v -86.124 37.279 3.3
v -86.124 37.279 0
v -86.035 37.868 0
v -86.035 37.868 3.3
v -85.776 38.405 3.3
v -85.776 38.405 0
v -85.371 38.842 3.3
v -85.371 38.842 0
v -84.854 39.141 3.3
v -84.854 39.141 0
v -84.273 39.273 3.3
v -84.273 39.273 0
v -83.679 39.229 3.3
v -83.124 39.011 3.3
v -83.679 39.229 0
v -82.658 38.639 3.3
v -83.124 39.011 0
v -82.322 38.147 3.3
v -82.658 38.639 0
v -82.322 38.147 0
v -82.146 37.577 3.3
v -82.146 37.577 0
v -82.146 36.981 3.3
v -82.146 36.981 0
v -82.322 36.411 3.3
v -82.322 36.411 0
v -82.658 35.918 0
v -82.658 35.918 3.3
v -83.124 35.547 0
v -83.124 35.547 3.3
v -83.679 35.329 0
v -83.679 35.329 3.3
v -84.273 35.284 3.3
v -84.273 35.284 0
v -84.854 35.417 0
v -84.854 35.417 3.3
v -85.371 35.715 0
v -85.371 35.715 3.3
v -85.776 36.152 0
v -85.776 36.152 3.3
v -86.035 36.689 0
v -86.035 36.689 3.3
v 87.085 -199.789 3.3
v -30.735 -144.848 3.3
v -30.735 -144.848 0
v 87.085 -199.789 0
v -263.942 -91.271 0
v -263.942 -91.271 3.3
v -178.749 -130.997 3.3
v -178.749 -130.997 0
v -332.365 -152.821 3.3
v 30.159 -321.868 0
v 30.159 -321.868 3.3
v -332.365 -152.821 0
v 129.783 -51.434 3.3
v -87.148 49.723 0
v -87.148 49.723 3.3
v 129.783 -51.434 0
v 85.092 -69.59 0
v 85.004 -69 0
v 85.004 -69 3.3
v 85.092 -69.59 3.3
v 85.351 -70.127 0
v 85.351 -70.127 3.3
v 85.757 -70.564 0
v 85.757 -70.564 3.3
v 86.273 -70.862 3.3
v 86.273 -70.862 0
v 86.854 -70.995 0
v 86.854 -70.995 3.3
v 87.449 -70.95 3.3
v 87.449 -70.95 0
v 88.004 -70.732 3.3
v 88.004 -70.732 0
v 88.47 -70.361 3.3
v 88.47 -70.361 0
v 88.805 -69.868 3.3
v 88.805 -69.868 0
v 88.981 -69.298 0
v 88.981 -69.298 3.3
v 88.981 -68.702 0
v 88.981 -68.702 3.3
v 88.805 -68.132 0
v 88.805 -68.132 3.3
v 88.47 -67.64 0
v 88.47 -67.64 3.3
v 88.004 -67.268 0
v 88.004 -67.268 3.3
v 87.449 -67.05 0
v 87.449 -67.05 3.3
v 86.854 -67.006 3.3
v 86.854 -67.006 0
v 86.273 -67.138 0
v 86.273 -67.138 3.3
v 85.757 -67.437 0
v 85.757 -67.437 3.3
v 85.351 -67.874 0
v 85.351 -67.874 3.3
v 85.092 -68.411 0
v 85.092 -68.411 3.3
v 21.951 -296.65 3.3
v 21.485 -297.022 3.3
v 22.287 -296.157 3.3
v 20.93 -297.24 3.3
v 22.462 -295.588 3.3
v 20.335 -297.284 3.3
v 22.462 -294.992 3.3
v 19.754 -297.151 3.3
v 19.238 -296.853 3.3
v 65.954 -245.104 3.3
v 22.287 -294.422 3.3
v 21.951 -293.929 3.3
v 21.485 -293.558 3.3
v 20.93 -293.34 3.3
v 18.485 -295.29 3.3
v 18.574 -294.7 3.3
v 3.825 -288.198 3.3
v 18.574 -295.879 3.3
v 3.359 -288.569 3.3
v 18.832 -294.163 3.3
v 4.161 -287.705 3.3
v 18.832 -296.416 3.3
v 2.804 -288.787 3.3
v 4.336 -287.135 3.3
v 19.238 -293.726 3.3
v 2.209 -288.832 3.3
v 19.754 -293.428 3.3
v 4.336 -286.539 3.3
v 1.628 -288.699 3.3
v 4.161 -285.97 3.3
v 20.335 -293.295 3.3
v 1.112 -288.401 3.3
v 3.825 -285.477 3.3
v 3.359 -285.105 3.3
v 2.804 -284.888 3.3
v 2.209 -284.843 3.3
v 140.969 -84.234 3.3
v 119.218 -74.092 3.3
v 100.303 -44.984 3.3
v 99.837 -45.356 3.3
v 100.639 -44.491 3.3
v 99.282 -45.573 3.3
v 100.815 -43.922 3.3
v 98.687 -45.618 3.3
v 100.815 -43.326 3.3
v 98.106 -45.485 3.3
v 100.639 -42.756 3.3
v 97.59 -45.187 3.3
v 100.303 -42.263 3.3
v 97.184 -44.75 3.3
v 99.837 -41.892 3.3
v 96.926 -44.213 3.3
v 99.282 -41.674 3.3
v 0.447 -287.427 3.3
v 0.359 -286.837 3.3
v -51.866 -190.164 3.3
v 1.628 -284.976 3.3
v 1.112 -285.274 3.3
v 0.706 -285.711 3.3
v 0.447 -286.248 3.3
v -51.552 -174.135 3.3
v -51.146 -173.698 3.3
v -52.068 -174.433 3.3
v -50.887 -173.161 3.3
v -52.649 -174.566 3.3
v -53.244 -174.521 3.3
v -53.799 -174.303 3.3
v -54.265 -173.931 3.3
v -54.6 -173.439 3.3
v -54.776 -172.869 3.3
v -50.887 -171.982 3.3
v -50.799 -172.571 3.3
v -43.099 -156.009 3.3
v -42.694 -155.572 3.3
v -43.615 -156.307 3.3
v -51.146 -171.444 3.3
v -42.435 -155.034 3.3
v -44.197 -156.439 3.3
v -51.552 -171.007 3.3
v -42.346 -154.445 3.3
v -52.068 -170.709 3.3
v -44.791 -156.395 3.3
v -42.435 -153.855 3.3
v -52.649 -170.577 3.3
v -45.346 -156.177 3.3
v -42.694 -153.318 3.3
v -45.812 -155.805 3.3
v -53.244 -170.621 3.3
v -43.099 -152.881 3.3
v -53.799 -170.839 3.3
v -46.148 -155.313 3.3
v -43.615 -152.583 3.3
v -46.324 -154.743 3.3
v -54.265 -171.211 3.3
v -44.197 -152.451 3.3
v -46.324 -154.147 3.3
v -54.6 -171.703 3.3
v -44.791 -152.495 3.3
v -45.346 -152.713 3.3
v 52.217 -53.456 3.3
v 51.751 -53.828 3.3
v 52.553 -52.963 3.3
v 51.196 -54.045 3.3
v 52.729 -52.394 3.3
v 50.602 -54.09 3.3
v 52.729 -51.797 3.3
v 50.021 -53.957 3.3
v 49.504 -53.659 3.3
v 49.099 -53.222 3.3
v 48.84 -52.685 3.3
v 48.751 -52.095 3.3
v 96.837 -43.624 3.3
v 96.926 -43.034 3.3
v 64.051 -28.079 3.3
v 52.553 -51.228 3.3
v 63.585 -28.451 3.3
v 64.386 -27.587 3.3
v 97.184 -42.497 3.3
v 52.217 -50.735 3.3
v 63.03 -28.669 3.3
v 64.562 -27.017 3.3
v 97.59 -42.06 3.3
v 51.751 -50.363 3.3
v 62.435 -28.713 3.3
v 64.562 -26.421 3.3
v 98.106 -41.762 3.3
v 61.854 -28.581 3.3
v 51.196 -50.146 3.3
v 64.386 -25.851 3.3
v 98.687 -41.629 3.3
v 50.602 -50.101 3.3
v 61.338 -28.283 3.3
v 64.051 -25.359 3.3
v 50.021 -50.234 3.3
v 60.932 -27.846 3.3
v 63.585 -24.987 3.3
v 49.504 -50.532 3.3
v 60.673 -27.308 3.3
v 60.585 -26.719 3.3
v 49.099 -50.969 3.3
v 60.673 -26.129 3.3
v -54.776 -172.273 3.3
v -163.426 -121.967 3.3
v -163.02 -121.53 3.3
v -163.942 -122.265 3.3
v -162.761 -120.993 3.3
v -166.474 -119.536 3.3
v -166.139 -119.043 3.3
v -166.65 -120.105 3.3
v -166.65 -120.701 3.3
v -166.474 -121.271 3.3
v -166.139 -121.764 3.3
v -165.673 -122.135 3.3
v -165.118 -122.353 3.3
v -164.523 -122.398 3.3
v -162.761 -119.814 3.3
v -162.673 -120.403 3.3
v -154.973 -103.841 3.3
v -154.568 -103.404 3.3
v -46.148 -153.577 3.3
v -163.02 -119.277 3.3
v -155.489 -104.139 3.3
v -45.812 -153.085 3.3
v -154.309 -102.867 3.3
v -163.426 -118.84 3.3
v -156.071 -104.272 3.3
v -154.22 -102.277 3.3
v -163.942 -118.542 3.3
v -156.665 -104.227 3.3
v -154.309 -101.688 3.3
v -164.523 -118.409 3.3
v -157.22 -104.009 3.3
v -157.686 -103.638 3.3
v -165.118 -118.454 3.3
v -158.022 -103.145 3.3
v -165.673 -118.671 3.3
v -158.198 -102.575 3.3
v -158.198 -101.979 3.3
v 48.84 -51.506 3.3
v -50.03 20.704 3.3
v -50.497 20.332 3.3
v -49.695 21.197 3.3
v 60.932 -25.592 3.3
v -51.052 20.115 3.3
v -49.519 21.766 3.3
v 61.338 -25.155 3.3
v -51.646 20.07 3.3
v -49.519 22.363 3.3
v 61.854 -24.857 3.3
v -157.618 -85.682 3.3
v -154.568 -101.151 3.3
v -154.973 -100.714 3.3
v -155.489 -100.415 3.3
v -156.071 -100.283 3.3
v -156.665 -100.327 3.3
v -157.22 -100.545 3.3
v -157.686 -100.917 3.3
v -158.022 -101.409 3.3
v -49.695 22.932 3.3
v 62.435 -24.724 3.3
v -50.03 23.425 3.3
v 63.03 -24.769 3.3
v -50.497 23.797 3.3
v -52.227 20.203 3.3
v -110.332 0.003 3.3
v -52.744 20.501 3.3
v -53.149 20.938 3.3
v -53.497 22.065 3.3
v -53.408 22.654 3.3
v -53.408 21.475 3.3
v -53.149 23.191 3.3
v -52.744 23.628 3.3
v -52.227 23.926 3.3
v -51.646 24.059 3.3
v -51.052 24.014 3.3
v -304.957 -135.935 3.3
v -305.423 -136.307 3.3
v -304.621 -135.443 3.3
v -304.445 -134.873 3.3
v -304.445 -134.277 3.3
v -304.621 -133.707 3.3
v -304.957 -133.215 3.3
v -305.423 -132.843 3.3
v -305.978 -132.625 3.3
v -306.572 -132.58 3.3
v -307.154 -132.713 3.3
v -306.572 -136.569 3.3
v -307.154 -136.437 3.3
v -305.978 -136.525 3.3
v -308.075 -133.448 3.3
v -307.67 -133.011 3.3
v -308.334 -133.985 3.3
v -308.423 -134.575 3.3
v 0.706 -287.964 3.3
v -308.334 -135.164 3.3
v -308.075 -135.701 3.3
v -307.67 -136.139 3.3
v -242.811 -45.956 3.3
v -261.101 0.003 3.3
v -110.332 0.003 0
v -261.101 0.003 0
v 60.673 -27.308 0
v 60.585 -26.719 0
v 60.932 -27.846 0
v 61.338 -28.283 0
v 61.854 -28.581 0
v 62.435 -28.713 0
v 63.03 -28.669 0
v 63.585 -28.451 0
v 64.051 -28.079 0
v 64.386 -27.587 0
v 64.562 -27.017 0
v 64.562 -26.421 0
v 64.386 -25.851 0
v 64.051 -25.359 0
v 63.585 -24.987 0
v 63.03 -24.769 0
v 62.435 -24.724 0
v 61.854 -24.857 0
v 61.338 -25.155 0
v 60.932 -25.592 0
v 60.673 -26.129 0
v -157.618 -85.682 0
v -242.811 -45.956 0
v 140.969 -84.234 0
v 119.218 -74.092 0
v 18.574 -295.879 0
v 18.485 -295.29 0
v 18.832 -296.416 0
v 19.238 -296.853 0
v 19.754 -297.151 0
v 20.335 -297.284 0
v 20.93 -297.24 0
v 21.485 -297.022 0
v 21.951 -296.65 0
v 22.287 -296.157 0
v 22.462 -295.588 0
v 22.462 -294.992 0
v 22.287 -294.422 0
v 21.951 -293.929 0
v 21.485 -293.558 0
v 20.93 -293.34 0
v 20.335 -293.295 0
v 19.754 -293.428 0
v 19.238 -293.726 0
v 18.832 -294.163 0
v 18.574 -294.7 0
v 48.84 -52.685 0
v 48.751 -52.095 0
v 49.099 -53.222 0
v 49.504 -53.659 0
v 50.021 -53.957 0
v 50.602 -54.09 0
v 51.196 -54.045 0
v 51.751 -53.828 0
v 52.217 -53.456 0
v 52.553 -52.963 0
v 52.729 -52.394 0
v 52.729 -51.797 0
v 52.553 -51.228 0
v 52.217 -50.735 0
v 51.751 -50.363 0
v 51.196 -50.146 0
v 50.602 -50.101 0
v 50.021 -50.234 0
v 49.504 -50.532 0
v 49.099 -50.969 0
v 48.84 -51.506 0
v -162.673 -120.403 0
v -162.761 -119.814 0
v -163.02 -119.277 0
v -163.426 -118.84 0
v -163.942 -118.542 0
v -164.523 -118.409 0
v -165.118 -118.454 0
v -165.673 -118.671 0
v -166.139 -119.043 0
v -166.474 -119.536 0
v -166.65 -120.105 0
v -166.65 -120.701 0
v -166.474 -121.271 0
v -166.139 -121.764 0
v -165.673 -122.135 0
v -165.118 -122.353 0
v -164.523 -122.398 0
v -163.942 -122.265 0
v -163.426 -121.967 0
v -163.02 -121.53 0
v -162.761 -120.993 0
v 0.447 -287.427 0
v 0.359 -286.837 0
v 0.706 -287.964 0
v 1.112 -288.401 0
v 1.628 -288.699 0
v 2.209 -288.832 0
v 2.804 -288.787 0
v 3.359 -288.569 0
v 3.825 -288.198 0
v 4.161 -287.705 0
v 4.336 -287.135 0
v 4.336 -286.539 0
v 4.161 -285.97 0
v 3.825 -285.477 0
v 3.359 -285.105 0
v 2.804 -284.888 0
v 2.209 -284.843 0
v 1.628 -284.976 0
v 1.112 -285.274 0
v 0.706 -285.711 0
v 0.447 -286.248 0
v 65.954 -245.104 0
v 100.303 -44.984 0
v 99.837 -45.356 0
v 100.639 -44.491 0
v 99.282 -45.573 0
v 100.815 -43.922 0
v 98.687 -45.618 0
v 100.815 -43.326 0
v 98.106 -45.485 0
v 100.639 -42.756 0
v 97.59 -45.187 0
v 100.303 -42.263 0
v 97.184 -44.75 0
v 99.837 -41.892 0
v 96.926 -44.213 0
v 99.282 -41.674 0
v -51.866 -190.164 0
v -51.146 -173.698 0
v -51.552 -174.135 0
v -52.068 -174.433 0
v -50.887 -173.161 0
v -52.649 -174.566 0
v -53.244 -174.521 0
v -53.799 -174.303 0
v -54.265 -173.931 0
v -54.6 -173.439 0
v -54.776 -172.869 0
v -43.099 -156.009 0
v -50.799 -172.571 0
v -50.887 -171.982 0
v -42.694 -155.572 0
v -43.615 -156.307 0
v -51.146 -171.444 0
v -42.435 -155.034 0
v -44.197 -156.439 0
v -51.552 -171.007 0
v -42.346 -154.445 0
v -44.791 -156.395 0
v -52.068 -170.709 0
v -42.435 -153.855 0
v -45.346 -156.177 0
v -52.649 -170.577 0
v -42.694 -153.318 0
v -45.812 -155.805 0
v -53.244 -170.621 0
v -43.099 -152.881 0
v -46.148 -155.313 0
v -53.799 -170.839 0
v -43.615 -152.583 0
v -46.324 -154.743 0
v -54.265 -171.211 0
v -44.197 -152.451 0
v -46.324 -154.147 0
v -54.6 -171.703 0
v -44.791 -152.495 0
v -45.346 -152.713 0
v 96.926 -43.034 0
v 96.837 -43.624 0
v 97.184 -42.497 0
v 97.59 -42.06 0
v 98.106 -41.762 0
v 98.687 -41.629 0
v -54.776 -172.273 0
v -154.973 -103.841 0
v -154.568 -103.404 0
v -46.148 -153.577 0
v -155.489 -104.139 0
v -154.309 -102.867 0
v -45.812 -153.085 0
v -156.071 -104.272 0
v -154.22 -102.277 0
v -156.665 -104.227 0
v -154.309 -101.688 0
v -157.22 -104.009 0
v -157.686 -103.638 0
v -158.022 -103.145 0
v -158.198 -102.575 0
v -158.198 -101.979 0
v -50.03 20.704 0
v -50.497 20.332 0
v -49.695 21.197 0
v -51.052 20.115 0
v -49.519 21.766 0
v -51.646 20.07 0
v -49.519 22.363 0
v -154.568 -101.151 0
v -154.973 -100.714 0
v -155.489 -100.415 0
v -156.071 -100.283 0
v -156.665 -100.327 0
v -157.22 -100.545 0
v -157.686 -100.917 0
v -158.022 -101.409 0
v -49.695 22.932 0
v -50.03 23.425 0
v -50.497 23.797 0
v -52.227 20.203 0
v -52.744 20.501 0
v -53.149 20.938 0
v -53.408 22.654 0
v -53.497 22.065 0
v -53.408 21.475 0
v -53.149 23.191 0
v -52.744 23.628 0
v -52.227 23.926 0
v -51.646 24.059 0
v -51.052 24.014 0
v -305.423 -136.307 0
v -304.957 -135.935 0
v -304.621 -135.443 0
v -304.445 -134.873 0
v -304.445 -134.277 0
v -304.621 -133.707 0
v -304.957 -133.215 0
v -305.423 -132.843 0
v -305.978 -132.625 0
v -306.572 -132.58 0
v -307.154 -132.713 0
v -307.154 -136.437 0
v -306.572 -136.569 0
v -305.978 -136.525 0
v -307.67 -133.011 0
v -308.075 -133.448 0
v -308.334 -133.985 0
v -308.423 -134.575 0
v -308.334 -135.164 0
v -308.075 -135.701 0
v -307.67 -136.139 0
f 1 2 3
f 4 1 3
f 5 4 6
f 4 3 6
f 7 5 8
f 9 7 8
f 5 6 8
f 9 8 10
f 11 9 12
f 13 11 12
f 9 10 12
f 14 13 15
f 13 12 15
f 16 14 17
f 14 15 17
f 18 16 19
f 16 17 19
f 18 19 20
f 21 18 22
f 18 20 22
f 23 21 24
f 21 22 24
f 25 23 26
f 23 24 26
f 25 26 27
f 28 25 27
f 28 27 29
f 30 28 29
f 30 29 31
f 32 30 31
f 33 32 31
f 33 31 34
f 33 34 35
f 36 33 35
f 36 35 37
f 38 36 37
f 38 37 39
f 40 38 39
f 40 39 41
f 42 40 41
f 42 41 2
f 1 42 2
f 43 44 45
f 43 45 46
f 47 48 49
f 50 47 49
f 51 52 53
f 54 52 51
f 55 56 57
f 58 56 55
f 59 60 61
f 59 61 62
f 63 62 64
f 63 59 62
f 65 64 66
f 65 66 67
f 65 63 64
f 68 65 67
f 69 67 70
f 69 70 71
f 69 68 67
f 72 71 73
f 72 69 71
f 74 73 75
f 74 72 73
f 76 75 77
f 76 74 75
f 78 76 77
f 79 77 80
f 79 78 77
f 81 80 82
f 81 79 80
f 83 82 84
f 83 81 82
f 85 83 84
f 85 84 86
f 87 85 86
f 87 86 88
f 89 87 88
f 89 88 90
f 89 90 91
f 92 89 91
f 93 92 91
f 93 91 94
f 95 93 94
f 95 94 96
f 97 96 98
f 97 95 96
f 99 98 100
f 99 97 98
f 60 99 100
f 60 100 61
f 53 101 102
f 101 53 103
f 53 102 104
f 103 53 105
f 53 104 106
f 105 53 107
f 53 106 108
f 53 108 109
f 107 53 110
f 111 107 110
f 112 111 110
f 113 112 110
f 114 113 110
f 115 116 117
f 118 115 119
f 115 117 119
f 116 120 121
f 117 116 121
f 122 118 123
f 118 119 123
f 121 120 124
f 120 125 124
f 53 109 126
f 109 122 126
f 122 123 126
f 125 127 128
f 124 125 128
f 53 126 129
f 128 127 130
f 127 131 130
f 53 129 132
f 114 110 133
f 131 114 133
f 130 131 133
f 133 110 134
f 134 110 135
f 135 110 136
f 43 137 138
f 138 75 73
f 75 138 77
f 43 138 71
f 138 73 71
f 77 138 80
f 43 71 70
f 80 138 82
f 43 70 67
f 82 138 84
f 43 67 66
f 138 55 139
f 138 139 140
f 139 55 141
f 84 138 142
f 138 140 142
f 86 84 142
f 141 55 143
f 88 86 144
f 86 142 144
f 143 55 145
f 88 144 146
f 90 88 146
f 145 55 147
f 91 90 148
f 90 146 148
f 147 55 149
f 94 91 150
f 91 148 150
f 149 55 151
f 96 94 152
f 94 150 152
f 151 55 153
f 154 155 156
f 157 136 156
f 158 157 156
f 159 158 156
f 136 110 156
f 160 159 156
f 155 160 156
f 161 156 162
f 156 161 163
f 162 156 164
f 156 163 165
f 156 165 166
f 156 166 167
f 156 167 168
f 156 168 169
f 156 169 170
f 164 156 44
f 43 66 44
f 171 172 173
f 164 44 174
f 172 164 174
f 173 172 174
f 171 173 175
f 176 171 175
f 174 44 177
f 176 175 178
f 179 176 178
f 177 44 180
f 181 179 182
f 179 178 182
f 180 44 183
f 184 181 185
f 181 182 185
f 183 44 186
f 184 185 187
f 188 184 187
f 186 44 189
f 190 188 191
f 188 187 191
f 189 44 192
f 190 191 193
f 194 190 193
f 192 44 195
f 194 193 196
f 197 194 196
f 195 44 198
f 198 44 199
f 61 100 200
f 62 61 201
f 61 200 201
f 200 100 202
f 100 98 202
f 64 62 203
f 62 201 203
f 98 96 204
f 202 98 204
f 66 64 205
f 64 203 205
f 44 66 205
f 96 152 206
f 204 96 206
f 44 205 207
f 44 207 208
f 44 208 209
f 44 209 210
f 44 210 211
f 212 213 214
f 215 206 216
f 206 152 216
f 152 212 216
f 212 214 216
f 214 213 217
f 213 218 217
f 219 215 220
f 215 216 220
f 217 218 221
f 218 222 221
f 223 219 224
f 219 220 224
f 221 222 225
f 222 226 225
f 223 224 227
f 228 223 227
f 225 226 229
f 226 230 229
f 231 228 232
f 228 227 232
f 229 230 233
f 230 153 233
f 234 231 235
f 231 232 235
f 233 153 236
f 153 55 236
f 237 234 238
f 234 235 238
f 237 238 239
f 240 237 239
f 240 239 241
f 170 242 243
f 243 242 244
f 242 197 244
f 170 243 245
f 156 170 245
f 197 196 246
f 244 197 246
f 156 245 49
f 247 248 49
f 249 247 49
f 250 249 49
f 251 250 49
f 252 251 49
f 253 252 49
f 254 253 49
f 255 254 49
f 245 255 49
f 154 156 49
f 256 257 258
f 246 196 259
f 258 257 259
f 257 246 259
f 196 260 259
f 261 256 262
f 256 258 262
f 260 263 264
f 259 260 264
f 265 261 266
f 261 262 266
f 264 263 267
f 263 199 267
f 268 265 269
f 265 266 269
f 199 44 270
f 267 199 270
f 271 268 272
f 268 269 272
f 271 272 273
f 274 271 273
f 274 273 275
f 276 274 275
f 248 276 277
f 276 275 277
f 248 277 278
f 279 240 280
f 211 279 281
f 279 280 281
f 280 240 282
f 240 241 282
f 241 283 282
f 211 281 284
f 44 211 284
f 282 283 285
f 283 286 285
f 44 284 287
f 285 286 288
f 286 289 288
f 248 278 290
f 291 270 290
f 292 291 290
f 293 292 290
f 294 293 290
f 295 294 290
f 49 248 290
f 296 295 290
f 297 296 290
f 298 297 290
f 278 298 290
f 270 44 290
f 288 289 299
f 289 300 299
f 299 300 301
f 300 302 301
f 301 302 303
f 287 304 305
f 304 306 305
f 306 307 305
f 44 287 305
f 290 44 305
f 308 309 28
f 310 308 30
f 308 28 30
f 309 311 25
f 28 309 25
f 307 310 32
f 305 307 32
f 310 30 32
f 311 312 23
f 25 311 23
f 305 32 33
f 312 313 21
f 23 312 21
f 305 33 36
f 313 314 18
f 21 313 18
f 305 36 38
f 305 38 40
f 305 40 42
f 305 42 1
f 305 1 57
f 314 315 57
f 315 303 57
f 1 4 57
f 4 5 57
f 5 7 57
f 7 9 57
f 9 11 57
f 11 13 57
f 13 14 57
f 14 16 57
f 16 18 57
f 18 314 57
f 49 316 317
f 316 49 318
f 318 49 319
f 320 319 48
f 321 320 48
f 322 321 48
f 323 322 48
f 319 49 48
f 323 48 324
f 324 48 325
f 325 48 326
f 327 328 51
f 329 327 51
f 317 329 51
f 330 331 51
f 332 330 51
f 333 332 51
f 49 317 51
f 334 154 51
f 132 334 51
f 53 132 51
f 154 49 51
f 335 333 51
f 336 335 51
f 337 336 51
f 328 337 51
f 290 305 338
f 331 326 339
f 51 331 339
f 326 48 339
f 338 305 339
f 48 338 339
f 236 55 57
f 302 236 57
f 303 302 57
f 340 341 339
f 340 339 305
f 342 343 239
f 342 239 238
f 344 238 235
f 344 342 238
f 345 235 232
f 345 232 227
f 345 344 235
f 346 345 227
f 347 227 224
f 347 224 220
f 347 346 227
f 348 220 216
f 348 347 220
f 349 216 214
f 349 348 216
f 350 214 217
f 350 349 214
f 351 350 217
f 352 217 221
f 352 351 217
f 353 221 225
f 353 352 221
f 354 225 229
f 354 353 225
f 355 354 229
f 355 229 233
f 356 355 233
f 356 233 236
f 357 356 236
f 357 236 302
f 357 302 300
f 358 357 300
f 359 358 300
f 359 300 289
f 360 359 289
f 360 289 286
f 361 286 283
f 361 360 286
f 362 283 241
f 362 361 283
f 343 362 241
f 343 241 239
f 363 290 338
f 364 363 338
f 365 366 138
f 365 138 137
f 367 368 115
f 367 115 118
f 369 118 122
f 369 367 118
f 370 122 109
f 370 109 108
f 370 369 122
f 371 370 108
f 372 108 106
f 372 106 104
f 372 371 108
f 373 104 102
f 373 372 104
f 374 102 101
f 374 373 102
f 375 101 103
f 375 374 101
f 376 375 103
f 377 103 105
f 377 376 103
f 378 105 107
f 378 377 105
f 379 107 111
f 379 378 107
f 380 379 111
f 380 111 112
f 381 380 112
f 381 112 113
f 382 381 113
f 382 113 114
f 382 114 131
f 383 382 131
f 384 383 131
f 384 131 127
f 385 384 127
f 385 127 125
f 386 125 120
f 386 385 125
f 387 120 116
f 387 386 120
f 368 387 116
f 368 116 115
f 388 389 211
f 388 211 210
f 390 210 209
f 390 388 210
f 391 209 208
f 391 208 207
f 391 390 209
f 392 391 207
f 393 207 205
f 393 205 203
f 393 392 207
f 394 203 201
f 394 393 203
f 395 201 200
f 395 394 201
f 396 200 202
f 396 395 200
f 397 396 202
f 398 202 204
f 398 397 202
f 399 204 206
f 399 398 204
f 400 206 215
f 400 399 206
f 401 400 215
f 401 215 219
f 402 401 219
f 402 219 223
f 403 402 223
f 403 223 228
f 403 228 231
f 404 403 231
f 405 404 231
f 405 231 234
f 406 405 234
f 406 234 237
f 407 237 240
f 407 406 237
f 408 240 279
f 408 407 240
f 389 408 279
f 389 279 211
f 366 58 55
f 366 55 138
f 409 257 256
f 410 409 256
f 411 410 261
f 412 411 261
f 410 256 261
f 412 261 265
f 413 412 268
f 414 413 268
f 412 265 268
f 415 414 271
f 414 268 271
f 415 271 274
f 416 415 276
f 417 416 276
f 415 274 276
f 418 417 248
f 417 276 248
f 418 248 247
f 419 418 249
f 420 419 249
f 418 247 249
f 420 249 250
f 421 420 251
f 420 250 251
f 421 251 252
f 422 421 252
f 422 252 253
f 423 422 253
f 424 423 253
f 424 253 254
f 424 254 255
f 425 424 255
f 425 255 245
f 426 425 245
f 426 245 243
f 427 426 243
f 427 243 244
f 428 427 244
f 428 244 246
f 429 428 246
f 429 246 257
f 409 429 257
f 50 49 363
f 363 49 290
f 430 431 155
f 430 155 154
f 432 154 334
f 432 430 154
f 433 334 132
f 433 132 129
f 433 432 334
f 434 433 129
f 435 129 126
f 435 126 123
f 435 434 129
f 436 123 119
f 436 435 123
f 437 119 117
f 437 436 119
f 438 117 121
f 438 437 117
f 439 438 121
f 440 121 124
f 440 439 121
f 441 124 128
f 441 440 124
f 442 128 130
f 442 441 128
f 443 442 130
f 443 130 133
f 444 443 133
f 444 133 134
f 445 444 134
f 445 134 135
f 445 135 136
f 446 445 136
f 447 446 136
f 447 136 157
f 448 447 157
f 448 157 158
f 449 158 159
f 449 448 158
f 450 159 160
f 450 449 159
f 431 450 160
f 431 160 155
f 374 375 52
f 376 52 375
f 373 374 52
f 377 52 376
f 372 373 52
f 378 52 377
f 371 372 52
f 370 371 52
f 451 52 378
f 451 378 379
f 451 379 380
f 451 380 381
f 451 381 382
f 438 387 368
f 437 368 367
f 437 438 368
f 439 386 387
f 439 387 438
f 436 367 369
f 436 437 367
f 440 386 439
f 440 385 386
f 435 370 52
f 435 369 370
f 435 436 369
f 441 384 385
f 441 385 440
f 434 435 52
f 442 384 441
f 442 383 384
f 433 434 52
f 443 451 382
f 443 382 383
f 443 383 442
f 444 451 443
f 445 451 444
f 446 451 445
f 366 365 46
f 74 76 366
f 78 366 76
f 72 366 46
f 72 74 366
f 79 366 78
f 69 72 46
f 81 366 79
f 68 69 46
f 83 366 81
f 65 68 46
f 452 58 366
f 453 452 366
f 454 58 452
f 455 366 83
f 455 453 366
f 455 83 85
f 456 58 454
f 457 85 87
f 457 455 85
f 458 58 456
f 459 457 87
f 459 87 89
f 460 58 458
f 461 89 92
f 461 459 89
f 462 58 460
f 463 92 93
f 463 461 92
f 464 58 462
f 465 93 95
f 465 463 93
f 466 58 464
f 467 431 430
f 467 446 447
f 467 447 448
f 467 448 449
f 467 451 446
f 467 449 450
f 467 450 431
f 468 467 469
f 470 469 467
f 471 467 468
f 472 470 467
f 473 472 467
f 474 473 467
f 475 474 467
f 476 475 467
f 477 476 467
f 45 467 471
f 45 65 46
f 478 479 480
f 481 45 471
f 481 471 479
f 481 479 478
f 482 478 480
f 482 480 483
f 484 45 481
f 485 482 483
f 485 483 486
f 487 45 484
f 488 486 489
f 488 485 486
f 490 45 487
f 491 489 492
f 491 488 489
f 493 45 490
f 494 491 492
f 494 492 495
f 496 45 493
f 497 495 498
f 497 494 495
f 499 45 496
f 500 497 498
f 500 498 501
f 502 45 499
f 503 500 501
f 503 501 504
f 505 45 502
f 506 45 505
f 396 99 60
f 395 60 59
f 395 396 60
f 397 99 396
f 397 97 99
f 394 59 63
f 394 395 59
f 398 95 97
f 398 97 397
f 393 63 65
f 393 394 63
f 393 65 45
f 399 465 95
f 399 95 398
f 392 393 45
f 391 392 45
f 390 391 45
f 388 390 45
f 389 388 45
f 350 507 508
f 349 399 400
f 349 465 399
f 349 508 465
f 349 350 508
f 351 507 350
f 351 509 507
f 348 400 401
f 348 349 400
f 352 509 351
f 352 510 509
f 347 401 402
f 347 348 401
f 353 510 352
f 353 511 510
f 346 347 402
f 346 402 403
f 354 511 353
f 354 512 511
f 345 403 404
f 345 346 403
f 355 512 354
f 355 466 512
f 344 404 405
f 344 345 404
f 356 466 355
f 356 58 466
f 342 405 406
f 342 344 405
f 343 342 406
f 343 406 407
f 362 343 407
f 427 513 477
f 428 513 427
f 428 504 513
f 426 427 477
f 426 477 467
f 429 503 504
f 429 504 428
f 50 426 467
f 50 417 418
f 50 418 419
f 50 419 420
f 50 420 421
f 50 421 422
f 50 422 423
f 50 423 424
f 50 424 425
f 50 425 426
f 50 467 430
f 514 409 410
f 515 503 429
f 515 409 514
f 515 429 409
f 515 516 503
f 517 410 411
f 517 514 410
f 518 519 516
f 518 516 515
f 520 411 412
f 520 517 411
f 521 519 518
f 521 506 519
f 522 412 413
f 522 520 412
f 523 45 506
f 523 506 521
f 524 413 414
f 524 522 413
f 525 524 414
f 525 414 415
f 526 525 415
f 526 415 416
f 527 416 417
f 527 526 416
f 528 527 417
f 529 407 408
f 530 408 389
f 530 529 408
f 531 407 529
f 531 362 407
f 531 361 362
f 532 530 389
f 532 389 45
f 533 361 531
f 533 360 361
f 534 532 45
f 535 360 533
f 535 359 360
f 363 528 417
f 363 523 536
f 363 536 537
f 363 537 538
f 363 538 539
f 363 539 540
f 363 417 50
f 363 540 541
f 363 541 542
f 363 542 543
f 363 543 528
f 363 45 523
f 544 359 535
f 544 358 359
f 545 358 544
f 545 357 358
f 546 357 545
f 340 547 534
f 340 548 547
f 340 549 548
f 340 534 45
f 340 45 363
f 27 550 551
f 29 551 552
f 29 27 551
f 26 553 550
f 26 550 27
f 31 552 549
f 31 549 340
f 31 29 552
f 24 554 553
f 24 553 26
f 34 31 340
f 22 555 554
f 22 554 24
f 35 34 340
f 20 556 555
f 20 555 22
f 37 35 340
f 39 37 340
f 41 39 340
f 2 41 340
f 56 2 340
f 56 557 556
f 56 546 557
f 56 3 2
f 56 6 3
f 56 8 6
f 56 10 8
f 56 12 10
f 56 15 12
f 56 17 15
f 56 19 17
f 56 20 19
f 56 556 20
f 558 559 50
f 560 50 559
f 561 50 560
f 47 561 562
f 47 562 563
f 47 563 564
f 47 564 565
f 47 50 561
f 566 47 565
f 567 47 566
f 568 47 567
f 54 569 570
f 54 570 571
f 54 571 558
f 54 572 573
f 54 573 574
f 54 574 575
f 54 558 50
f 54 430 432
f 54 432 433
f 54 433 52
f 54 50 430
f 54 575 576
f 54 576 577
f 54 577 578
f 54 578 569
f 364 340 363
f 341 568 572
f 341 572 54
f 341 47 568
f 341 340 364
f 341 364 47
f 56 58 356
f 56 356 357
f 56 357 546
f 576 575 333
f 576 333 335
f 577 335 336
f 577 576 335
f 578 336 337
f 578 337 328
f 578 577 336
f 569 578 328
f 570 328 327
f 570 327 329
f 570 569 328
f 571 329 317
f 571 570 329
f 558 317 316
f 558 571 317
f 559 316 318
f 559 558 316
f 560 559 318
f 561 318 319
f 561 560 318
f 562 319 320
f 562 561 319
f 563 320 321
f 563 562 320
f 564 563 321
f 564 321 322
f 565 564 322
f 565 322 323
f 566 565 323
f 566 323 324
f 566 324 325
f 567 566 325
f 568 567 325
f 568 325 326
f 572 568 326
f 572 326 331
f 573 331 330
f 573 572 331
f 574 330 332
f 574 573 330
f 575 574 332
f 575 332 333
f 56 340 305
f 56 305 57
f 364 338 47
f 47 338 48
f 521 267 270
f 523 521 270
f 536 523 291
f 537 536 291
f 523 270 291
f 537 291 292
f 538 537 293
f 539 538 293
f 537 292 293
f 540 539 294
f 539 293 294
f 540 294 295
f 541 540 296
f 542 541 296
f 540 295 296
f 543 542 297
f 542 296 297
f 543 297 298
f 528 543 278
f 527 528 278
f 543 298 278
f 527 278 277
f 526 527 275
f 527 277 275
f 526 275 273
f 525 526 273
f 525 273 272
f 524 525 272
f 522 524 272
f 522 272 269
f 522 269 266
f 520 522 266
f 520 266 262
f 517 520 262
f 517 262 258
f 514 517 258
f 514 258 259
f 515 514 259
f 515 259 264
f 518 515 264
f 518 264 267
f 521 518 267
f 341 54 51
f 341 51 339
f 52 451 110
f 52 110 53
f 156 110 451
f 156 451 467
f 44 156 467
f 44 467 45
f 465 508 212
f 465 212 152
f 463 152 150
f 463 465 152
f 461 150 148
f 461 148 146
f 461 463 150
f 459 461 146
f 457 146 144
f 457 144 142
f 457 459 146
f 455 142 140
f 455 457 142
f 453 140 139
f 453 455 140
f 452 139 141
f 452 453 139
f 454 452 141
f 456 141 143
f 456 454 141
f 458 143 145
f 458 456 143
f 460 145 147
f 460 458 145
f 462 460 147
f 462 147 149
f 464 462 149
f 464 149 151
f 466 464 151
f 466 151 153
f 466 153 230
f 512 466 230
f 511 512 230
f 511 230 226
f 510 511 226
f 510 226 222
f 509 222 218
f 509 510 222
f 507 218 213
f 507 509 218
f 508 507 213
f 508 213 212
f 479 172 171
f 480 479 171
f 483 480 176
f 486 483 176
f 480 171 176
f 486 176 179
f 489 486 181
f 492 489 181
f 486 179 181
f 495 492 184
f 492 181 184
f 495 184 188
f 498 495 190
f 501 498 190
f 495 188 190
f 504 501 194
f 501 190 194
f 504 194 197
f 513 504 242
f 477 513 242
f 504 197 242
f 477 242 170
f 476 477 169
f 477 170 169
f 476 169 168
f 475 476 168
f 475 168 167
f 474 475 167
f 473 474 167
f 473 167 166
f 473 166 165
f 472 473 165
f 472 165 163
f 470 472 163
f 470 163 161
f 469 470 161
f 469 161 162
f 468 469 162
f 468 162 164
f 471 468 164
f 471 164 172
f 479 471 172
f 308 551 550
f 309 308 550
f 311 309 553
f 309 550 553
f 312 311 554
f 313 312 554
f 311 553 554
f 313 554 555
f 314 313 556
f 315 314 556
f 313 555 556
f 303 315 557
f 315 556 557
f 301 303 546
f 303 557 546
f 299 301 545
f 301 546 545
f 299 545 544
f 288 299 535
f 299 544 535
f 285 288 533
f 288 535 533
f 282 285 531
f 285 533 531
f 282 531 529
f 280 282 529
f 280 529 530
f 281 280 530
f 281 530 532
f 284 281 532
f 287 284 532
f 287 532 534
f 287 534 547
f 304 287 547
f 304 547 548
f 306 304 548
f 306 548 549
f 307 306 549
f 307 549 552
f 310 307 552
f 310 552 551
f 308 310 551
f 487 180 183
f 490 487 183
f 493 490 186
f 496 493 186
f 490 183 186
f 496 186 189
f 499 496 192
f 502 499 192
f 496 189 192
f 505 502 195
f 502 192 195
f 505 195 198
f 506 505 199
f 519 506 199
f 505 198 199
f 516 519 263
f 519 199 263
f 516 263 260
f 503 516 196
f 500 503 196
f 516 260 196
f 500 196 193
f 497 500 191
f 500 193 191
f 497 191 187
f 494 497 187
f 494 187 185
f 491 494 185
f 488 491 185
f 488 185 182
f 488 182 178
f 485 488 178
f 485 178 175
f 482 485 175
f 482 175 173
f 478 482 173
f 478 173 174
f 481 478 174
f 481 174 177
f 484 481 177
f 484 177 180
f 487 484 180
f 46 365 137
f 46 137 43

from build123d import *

# Parameters (mm, degrees)
SKETCH1_R           = 2
BOSS_EXTRUDE1_DEPTH = 3.3
SKETCH2_R           = 2
CUT_EXTRUDE1_DEPTH  = 463.683772706
CUT_EXTRUDE2_DEPTH  = 10
CUT_EXTRUDE3_DEPTH  = 10
SKETCH7_R           = 2
CUT_EXTRUDE4_DEPTH  = 10


with BuildPart() as part:
    # Sketch1 → Boss-Extrude1 (new body)
    with BuildSketch(Plane.XY):
        Polygon((-261.101380084, 0.003466677), (-110.332441909, 0.003466677), (-87.147938799, 49.722794044), (129.783117347, -51.433818728), (119.217660803, -74.091513404), (140.969047692, -84.234351686), (30.158539464, -321.868253447), (-332.364575351, -152.820948751), align=None)
        with Locations(Location((87.00354845, -69.000227384, 0), (0, 0, 180))):
            Circle(SKETCH1_R, mode=Mode.SUBTRACT)
        with Locations(Location((98.836859779, -43.623609347, 0), (0, 0, 180))):
            Circle(SKETCH1_R, mode=Mode.SUBTRACT)
        with Locations(Location((62.584548297, -26.718878877, 0), (0, 0, 180))):
            Circle(SKETCH1_R, mode=Mode.SUBTRACT)
        with Locations(Location((50.751236969, -52.095496914, 0), (0, 0, 180))):
            Circle(SKETCH1_R, mode=Mode.SUBTRACT)
        with Locations(Location((2.358593217, -286.837367237, 0), (0, 0, 180))):
            Circle(SKETCH1_R, mode=Mode.SUBTRACT)
        with Locations(Location((-306.422910118, -134.574853143, 0), (0, 0, 180))):
            Circle(SKETCH1_R, mode=Mode.SUBTRACT)
        with Locations(Location((20.484748958, -295.289732471, 0), (0, 0, 180))):
            Circle(SKETCH1_R, mode=Mode.SUBTRACT)
    extrude(amount=BOSS_EXTRUDE1_DEPTH)

    # Sketch2 → Cut-Extrude1 (cut, through all)
    with BuildSketch(Plane(origin=(0, 0, 0), x_dir=(-1, 0, 0), z_dir=(0, 0, -1))):
        with Locations((51.496578787, 22.064512657)):
            Circle(SKETCH2_R)
        with Locations((84.12365912, 37.27877008)):
            Circle(SKETCH2_R)
    extrude(amount=-CUT_EXTRUDE1_DEPTH, mode=Mode.SUBTRACT)

    # Sketch5 → Cut-Extrude2 (cut)
    with BuildSketch(Plane.XY.offset(3.3)):
        Polygon((65.954306233, -245.103983885), (-51.865706081, -190.163609859), (-30.734792994, -144.848220507), (87.08521932, -199.788594533), align=None)
    extrude(amount=-CUT_EXTRUDE2_DEPTH, mode=Mode.SUBTRACT)

    # Sketch6 → Cut-Extrude3 (cut)
    with BuildSketch(Plane.XY.offset(3.3)):
        Polygon((-178.748796266, -130.997053215), (-157.617883179, -85.681663863), (-242.810815161, -45.955547259), (-263.941728248, -91.270936611), align=None)
    extrude(amount=-CUT_EXTRUDE3_DEPTH, mode=Mode.SUBTRACT)

    # Sketch7 → Cut-Extrude4 (cut)
    with BuildSketch(Plane.XY.offset(3.3)):
        with Locations((-52.7985286, -172.571100935)):
            Circle(SKETCH7_R)
        with Locations((-44.346163365, -154.444945194)):
            Circle(SKETCH7_R)
        with Locations((-164.672545808, -120.403389962)):
            Circle(SKETCH7_R)
        with Locations((-156.220180573, -102.277234221)):
            Circle(SKETCH7_R)
    extrude(amount=-CUT_EXTRUDE4_DEPTH, mode=Mode.SUBTRACT)


solid = part.part
